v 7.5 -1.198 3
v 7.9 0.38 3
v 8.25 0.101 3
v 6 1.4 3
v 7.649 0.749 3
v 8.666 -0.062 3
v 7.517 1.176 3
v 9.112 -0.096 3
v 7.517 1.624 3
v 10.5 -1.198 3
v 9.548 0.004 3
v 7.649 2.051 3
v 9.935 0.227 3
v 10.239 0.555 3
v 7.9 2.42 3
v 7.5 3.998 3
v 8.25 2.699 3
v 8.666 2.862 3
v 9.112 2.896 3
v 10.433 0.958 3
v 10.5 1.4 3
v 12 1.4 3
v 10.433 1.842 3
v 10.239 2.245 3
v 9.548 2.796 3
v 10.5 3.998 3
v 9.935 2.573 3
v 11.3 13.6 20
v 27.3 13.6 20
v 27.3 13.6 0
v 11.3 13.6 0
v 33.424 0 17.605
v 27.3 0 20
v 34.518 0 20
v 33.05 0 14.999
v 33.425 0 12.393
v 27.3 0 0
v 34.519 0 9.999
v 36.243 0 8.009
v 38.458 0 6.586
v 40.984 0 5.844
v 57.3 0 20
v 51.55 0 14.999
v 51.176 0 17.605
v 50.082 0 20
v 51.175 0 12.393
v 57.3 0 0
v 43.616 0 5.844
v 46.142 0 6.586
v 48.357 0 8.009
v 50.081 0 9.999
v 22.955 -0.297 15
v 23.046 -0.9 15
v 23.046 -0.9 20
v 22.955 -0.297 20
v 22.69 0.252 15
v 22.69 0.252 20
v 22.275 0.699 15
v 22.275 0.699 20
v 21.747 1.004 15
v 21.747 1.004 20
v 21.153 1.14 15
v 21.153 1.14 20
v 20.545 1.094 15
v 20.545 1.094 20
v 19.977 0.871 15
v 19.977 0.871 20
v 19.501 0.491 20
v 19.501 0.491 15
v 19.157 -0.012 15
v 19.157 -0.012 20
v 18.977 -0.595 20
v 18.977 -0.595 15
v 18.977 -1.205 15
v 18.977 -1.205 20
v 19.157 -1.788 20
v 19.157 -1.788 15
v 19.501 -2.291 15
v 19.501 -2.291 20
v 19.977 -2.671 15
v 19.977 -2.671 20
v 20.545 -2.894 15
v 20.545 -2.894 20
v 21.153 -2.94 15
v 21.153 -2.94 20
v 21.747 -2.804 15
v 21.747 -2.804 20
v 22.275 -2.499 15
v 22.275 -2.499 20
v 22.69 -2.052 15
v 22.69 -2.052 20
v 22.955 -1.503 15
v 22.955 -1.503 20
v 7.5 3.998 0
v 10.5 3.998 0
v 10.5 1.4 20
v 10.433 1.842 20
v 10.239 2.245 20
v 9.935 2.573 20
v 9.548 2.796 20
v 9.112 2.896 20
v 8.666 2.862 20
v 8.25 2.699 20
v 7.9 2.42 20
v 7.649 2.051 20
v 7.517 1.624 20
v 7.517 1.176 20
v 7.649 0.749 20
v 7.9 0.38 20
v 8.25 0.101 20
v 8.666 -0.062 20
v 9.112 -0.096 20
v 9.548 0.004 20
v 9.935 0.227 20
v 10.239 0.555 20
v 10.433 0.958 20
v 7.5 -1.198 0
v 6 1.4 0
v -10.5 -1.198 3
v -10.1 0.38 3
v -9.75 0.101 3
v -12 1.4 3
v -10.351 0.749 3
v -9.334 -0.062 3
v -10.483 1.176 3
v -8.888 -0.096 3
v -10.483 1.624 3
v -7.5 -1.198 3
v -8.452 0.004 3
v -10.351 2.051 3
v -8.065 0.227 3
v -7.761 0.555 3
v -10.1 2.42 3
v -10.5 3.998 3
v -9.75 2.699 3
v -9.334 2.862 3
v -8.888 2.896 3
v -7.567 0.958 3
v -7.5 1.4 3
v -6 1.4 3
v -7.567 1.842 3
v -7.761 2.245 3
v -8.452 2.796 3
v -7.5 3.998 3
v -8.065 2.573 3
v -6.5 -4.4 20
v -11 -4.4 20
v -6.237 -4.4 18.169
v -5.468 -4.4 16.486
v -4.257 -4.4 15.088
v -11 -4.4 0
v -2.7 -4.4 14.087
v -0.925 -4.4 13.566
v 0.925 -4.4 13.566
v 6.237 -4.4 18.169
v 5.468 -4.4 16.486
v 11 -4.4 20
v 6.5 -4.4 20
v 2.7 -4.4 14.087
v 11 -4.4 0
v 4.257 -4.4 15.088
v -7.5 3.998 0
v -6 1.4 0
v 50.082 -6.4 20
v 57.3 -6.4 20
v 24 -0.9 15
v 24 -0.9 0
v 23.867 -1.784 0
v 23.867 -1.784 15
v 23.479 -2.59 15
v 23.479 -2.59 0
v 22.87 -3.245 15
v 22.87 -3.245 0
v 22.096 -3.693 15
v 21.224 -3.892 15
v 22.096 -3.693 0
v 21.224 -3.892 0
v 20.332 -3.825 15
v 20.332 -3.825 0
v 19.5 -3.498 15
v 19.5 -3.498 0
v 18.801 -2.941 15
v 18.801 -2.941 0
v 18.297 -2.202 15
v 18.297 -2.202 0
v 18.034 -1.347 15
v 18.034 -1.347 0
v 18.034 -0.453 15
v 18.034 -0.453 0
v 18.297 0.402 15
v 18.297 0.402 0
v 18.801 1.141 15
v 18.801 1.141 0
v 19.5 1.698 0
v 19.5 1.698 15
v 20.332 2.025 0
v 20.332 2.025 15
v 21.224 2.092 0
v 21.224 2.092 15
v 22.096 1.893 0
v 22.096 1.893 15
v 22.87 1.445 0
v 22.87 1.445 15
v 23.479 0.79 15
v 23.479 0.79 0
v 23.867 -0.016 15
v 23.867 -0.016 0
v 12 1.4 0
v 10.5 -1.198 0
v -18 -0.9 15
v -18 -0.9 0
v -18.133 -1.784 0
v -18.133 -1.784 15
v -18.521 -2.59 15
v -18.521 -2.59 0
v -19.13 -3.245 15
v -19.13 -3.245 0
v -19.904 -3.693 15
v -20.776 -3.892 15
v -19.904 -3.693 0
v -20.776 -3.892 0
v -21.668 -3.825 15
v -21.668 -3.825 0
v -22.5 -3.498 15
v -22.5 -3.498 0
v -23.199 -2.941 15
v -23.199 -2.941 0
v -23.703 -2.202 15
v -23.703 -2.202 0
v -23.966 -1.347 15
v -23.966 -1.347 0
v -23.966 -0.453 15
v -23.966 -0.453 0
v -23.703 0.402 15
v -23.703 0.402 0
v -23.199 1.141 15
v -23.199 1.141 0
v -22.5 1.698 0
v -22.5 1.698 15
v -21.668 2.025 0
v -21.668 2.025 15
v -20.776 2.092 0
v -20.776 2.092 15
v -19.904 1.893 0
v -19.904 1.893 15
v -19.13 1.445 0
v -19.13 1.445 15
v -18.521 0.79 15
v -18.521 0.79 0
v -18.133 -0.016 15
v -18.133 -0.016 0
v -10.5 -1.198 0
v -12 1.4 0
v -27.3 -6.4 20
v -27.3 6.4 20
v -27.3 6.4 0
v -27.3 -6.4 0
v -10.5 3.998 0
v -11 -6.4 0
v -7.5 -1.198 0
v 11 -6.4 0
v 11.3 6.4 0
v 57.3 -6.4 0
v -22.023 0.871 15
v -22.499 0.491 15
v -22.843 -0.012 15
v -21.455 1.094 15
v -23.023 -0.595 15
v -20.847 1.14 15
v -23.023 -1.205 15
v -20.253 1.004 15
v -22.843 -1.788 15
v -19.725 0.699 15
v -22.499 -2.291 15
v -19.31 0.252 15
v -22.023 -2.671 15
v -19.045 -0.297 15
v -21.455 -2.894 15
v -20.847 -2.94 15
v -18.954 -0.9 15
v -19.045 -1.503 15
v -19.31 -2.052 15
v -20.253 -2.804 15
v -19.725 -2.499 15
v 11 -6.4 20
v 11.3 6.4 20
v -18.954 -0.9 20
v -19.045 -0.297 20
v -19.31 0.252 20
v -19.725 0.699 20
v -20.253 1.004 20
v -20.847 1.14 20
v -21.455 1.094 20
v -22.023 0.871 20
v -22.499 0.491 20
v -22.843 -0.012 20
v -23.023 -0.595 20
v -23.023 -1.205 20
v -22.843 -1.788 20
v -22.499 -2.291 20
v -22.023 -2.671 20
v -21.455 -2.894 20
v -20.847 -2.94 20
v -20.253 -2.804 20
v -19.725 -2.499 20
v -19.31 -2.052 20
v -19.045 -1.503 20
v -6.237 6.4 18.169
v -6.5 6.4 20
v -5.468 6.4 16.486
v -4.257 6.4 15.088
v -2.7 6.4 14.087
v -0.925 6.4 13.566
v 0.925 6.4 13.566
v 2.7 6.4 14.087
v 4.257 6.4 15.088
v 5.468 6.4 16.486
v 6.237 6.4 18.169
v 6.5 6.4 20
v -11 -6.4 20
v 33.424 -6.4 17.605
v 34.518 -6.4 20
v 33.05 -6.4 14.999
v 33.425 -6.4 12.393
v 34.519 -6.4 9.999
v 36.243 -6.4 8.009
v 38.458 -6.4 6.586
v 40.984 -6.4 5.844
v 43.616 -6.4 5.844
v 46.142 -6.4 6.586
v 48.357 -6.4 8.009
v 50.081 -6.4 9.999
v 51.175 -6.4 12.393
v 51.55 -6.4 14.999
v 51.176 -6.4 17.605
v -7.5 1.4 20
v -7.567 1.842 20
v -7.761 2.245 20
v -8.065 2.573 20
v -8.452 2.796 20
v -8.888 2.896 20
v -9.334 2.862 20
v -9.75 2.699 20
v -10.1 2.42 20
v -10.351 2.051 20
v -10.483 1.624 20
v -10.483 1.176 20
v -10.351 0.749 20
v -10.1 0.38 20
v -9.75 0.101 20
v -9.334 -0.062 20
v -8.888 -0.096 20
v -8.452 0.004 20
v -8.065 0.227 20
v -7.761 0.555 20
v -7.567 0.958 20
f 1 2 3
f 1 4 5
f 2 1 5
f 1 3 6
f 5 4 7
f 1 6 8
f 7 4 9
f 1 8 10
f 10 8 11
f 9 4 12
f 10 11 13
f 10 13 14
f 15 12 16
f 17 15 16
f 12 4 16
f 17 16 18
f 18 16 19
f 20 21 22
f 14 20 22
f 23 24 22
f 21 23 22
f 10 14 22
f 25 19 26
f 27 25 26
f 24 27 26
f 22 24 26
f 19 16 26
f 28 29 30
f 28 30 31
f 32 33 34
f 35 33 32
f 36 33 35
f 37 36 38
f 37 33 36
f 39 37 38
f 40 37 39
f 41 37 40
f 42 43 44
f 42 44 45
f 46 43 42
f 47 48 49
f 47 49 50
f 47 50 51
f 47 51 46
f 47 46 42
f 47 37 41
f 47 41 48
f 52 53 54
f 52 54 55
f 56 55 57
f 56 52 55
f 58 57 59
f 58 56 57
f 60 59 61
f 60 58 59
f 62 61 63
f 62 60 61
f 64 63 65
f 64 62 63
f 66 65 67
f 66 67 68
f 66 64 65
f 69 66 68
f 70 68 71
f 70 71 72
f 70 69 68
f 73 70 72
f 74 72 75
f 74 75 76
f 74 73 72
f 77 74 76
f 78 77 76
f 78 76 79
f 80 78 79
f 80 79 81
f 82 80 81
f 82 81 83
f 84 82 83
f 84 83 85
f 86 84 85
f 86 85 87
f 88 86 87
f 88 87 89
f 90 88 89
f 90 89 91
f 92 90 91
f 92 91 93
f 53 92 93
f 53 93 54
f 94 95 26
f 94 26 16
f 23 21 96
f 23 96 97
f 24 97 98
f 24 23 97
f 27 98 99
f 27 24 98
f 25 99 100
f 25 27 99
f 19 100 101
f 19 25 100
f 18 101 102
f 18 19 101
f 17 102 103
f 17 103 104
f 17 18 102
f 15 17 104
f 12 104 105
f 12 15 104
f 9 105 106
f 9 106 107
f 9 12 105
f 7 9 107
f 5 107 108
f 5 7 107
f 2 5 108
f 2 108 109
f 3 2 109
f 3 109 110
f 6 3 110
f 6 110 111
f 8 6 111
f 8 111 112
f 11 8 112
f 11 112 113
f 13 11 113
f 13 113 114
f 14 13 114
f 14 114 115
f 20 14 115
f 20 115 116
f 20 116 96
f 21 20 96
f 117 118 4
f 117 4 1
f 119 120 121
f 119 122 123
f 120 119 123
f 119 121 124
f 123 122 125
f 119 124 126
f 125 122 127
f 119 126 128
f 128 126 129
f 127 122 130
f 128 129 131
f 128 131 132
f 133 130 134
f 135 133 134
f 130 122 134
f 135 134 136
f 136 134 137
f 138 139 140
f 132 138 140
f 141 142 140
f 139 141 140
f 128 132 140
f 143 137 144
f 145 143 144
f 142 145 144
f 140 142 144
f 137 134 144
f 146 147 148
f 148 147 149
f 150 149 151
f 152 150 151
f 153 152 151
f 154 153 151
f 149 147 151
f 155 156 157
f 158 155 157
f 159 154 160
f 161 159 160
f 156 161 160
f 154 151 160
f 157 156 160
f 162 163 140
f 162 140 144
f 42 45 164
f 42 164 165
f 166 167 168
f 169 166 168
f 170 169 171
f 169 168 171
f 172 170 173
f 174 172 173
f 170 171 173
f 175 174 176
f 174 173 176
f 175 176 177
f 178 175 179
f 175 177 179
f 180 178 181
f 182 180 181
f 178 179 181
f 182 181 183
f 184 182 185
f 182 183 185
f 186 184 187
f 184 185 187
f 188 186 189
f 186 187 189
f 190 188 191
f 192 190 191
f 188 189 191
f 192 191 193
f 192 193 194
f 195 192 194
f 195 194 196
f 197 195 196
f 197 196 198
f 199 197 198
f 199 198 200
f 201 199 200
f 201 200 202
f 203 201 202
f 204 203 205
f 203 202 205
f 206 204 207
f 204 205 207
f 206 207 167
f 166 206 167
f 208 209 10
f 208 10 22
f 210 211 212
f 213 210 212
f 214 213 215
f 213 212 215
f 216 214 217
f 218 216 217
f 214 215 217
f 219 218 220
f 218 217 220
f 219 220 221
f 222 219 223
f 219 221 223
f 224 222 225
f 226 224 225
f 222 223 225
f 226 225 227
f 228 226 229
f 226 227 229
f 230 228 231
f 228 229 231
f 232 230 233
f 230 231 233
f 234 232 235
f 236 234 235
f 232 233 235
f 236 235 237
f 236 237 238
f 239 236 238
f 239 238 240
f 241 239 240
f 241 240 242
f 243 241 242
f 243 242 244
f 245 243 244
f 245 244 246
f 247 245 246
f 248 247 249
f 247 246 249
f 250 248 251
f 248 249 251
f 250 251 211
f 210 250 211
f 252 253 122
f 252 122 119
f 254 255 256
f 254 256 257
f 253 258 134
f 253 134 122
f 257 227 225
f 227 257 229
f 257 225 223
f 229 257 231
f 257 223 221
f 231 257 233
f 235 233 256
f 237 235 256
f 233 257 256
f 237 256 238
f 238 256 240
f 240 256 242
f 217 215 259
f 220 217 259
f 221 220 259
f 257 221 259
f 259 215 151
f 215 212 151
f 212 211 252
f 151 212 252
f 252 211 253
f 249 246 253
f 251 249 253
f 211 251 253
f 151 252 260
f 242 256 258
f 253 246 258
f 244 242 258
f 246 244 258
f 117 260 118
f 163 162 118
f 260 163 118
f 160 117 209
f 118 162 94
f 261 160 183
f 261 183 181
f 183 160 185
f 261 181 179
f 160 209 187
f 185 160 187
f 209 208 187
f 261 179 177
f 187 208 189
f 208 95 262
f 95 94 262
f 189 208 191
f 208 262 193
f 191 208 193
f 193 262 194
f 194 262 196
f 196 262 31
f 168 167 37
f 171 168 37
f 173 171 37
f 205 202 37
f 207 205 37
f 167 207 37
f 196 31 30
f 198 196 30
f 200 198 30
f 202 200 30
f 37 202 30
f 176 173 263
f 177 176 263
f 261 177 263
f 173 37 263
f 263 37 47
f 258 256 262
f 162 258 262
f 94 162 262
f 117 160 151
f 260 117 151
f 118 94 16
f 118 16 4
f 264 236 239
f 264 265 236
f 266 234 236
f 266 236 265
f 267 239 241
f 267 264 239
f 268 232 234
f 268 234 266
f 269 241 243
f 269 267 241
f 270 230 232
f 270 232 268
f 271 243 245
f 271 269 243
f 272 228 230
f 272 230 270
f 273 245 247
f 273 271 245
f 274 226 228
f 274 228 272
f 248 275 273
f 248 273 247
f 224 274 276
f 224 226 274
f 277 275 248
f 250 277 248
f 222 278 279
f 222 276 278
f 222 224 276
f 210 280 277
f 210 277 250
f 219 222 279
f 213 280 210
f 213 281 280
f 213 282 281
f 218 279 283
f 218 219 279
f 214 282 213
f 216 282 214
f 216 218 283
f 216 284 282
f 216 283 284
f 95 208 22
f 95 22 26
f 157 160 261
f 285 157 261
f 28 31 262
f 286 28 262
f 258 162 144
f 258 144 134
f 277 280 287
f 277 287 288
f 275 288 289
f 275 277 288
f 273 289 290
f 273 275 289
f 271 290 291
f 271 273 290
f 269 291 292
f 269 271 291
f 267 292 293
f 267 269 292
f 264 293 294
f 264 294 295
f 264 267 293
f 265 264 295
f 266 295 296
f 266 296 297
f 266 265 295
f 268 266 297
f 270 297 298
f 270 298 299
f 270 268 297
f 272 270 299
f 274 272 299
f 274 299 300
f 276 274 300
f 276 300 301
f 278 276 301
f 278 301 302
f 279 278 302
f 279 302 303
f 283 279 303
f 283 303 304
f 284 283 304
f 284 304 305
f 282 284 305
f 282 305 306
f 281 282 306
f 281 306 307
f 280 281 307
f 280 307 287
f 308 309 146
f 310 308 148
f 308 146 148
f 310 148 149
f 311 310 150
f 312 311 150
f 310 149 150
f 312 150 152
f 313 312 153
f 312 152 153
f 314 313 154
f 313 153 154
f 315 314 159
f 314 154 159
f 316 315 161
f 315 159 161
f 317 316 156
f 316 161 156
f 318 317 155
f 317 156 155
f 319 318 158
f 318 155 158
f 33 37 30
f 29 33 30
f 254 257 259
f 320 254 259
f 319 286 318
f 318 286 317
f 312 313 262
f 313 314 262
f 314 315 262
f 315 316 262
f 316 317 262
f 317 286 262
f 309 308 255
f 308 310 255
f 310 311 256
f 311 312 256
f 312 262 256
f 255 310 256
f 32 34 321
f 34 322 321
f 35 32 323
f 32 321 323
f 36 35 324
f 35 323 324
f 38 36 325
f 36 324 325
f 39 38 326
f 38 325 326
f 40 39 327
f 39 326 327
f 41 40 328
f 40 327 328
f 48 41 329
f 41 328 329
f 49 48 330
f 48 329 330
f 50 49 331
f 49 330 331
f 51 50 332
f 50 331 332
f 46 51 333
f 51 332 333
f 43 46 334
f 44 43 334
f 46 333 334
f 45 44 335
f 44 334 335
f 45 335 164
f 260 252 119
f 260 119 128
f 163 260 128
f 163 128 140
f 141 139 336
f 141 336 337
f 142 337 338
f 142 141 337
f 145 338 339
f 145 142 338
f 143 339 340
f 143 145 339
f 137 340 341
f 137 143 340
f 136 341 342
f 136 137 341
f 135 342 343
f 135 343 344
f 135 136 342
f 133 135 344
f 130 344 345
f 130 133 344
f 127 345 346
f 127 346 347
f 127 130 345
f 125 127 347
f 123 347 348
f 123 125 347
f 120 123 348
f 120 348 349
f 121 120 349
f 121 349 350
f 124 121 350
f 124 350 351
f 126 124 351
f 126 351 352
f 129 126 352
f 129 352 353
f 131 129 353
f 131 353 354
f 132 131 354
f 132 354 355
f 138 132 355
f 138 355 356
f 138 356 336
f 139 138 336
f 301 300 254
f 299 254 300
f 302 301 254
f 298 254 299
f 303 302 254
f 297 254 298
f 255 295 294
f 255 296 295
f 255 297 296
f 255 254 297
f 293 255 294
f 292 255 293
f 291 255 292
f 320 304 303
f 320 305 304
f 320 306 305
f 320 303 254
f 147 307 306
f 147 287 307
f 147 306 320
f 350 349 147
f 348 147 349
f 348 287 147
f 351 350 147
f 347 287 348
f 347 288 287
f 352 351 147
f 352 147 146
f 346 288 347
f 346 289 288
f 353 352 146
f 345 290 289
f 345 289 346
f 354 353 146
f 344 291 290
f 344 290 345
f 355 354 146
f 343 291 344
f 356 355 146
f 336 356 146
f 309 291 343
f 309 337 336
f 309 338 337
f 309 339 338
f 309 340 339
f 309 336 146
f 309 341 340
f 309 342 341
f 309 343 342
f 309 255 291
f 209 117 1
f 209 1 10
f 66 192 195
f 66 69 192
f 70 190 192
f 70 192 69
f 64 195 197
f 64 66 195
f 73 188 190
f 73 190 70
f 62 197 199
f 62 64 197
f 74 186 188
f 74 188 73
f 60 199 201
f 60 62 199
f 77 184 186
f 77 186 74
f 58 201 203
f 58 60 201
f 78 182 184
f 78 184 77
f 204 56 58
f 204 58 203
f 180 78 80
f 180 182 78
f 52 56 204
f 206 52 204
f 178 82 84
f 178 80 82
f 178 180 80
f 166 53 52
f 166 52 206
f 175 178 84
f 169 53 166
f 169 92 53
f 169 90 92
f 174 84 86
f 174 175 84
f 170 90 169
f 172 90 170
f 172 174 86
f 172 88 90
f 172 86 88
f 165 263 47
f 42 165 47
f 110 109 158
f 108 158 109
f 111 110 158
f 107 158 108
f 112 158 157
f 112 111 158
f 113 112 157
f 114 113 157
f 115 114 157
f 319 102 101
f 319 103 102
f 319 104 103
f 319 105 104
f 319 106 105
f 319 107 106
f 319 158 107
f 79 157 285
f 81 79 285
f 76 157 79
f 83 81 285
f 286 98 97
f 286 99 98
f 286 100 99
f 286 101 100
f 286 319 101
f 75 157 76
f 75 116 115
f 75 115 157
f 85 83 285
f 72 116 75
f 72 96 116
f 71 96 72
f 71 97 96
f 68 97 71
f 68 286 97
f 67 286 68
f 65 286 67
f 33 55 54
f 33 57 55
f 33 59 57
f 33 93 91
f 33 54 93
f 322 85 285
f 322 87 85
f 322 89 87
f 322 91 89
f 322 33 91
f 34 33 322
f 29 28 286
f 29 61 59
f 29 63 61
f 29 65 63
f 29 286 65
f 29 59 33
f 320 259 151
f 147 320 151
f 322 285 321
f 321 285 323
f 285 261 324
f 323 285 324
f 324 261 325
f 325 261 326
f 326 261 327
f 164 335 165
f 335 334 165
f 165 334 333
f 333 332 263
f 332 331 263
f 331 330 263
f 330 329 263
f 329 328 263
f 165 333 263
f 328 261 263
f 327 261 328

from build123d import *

# Parameters (mm, degrees)
F0_R      = 2.0455133379
F0_R_2    = 1.5
F1_DEPTH  = 20
F0_W      = 30
F0_H      = 6.4
F2_DEPTH  = 30
F3_R      = 6.5
F4_DEPTH  = 18.001
F5_R      = 3
F5_R_2    = 2.0455133379
F6_DEPTH  = 15
F7_R      = 9.25
F8_DEPTH  = 20.001
F9_DEPTH  = 10
F11_DEPTH = 3


with BuildPart() as f1:
    # F0 (on Top) → F1 (new body)
    with BuildSketch(Plane.XY):
        Polygon((11.3, 6.4), (0, 6.4), (-27.3, 6.4), (-27.3, -6.4), (-11, -6.4), (-11, -4.4), (0, -4.4), (11, -4.4), (11, -6.4), (27.3, -6.4), (27.3, 0), (27.3, 13.6), (11.3, 13.6), align=None)
        with Locations((-21, -0.9)):
            Circle(F0_R, mode=Mode.SUBTRACT)
        with Locations((-9, 1.4)):
            Circle(F0_R_2, mode=Mode.SUBTRACT)
        with Locations((9, 1.4)):
            Circle(F0_R_2, mode=Mode.SUBTRACT)
        with Locations((21, -0.9)):
            Circle(F0_R, mode=Mode.SUBTRACT)
    extrude(amount=F1_DEPTH)

    # F0 (on Top) → F2 (join)
    with BuildSketch(Plane.XY):
        with Locations((42.3, -3.2)):
            Rectangle(F0_W, F0_H)
    extrude(amount=F2_DEPTH)

    # F3 (on face) → F4 (cut, through all)
    with BuildSketch(Plane.XZ.offset(4.4)):
        with Locations((0, 20)):
            Circle(F3_R)
    extrude(amount=-F4_DEPTH, mode=Mode.SUBTRACT)

    # F5 (on face) → F6 (cut)
    with BuildSketch(Plane(origin=(0, 0, 0), x_dir=(1, 0, 0), z_dir=(0, 0, -1))):
        with Locations((-21, 0.9)):
            Circle(F5_R)
        with Locations((-21, 0.9)):
            Circle(F5_R_2, mode=Mode.SUBTRACT)
        with Locations((21, 0.9)):
            Circle(F5_R)
        with Locations((21, 0.9)):
            Circle(F5_R_2, mode=Mode.SUBTRACT)
    extrude(amount=-F6_DEPTH, mode=Mode.SUBTRACT)

    # F7 (on face) → F8 (cut, through all)
    with BuildSketch(Plane.XZ.offset(6.4)):
        with Locations((42.3, 15)):
            Circle(F7_R)
    extrude(amount=-F8_DEPTH, mode=Mode.SUBTRACT)

    # F9 (cut): a face of the model
    f9_faces = [f1.faces().sort_by_distance(p)[0] for p in [
        (42.3, -3.2, 30),
    ]]
    extrude(f9_faces, amount=-F9_DEPTH, mode=Mode.SUBTRACT)

    # F10 (on face) → F11 (cut)
    with BuildSketch(Plane.XY):
        Polygon((12, 1.4), (10.5, 3.9980762114), (7.5, 3.9980762114), (6, 1.4), (7.5, -1.1980762114), (10.5, -1.1980762114), align=None)
        Polygon((-10.5, -1.1980762114), (-7.5, -1.1980762114), (-6, 1.4), (-7.5, 3.9980762114), (-10.5, 3.9980762114), (-12, 1.4), align=None)
    extrude(amount=F11_DEPTH, mode=Mode.SUBTRACT)


solid = f1.part
